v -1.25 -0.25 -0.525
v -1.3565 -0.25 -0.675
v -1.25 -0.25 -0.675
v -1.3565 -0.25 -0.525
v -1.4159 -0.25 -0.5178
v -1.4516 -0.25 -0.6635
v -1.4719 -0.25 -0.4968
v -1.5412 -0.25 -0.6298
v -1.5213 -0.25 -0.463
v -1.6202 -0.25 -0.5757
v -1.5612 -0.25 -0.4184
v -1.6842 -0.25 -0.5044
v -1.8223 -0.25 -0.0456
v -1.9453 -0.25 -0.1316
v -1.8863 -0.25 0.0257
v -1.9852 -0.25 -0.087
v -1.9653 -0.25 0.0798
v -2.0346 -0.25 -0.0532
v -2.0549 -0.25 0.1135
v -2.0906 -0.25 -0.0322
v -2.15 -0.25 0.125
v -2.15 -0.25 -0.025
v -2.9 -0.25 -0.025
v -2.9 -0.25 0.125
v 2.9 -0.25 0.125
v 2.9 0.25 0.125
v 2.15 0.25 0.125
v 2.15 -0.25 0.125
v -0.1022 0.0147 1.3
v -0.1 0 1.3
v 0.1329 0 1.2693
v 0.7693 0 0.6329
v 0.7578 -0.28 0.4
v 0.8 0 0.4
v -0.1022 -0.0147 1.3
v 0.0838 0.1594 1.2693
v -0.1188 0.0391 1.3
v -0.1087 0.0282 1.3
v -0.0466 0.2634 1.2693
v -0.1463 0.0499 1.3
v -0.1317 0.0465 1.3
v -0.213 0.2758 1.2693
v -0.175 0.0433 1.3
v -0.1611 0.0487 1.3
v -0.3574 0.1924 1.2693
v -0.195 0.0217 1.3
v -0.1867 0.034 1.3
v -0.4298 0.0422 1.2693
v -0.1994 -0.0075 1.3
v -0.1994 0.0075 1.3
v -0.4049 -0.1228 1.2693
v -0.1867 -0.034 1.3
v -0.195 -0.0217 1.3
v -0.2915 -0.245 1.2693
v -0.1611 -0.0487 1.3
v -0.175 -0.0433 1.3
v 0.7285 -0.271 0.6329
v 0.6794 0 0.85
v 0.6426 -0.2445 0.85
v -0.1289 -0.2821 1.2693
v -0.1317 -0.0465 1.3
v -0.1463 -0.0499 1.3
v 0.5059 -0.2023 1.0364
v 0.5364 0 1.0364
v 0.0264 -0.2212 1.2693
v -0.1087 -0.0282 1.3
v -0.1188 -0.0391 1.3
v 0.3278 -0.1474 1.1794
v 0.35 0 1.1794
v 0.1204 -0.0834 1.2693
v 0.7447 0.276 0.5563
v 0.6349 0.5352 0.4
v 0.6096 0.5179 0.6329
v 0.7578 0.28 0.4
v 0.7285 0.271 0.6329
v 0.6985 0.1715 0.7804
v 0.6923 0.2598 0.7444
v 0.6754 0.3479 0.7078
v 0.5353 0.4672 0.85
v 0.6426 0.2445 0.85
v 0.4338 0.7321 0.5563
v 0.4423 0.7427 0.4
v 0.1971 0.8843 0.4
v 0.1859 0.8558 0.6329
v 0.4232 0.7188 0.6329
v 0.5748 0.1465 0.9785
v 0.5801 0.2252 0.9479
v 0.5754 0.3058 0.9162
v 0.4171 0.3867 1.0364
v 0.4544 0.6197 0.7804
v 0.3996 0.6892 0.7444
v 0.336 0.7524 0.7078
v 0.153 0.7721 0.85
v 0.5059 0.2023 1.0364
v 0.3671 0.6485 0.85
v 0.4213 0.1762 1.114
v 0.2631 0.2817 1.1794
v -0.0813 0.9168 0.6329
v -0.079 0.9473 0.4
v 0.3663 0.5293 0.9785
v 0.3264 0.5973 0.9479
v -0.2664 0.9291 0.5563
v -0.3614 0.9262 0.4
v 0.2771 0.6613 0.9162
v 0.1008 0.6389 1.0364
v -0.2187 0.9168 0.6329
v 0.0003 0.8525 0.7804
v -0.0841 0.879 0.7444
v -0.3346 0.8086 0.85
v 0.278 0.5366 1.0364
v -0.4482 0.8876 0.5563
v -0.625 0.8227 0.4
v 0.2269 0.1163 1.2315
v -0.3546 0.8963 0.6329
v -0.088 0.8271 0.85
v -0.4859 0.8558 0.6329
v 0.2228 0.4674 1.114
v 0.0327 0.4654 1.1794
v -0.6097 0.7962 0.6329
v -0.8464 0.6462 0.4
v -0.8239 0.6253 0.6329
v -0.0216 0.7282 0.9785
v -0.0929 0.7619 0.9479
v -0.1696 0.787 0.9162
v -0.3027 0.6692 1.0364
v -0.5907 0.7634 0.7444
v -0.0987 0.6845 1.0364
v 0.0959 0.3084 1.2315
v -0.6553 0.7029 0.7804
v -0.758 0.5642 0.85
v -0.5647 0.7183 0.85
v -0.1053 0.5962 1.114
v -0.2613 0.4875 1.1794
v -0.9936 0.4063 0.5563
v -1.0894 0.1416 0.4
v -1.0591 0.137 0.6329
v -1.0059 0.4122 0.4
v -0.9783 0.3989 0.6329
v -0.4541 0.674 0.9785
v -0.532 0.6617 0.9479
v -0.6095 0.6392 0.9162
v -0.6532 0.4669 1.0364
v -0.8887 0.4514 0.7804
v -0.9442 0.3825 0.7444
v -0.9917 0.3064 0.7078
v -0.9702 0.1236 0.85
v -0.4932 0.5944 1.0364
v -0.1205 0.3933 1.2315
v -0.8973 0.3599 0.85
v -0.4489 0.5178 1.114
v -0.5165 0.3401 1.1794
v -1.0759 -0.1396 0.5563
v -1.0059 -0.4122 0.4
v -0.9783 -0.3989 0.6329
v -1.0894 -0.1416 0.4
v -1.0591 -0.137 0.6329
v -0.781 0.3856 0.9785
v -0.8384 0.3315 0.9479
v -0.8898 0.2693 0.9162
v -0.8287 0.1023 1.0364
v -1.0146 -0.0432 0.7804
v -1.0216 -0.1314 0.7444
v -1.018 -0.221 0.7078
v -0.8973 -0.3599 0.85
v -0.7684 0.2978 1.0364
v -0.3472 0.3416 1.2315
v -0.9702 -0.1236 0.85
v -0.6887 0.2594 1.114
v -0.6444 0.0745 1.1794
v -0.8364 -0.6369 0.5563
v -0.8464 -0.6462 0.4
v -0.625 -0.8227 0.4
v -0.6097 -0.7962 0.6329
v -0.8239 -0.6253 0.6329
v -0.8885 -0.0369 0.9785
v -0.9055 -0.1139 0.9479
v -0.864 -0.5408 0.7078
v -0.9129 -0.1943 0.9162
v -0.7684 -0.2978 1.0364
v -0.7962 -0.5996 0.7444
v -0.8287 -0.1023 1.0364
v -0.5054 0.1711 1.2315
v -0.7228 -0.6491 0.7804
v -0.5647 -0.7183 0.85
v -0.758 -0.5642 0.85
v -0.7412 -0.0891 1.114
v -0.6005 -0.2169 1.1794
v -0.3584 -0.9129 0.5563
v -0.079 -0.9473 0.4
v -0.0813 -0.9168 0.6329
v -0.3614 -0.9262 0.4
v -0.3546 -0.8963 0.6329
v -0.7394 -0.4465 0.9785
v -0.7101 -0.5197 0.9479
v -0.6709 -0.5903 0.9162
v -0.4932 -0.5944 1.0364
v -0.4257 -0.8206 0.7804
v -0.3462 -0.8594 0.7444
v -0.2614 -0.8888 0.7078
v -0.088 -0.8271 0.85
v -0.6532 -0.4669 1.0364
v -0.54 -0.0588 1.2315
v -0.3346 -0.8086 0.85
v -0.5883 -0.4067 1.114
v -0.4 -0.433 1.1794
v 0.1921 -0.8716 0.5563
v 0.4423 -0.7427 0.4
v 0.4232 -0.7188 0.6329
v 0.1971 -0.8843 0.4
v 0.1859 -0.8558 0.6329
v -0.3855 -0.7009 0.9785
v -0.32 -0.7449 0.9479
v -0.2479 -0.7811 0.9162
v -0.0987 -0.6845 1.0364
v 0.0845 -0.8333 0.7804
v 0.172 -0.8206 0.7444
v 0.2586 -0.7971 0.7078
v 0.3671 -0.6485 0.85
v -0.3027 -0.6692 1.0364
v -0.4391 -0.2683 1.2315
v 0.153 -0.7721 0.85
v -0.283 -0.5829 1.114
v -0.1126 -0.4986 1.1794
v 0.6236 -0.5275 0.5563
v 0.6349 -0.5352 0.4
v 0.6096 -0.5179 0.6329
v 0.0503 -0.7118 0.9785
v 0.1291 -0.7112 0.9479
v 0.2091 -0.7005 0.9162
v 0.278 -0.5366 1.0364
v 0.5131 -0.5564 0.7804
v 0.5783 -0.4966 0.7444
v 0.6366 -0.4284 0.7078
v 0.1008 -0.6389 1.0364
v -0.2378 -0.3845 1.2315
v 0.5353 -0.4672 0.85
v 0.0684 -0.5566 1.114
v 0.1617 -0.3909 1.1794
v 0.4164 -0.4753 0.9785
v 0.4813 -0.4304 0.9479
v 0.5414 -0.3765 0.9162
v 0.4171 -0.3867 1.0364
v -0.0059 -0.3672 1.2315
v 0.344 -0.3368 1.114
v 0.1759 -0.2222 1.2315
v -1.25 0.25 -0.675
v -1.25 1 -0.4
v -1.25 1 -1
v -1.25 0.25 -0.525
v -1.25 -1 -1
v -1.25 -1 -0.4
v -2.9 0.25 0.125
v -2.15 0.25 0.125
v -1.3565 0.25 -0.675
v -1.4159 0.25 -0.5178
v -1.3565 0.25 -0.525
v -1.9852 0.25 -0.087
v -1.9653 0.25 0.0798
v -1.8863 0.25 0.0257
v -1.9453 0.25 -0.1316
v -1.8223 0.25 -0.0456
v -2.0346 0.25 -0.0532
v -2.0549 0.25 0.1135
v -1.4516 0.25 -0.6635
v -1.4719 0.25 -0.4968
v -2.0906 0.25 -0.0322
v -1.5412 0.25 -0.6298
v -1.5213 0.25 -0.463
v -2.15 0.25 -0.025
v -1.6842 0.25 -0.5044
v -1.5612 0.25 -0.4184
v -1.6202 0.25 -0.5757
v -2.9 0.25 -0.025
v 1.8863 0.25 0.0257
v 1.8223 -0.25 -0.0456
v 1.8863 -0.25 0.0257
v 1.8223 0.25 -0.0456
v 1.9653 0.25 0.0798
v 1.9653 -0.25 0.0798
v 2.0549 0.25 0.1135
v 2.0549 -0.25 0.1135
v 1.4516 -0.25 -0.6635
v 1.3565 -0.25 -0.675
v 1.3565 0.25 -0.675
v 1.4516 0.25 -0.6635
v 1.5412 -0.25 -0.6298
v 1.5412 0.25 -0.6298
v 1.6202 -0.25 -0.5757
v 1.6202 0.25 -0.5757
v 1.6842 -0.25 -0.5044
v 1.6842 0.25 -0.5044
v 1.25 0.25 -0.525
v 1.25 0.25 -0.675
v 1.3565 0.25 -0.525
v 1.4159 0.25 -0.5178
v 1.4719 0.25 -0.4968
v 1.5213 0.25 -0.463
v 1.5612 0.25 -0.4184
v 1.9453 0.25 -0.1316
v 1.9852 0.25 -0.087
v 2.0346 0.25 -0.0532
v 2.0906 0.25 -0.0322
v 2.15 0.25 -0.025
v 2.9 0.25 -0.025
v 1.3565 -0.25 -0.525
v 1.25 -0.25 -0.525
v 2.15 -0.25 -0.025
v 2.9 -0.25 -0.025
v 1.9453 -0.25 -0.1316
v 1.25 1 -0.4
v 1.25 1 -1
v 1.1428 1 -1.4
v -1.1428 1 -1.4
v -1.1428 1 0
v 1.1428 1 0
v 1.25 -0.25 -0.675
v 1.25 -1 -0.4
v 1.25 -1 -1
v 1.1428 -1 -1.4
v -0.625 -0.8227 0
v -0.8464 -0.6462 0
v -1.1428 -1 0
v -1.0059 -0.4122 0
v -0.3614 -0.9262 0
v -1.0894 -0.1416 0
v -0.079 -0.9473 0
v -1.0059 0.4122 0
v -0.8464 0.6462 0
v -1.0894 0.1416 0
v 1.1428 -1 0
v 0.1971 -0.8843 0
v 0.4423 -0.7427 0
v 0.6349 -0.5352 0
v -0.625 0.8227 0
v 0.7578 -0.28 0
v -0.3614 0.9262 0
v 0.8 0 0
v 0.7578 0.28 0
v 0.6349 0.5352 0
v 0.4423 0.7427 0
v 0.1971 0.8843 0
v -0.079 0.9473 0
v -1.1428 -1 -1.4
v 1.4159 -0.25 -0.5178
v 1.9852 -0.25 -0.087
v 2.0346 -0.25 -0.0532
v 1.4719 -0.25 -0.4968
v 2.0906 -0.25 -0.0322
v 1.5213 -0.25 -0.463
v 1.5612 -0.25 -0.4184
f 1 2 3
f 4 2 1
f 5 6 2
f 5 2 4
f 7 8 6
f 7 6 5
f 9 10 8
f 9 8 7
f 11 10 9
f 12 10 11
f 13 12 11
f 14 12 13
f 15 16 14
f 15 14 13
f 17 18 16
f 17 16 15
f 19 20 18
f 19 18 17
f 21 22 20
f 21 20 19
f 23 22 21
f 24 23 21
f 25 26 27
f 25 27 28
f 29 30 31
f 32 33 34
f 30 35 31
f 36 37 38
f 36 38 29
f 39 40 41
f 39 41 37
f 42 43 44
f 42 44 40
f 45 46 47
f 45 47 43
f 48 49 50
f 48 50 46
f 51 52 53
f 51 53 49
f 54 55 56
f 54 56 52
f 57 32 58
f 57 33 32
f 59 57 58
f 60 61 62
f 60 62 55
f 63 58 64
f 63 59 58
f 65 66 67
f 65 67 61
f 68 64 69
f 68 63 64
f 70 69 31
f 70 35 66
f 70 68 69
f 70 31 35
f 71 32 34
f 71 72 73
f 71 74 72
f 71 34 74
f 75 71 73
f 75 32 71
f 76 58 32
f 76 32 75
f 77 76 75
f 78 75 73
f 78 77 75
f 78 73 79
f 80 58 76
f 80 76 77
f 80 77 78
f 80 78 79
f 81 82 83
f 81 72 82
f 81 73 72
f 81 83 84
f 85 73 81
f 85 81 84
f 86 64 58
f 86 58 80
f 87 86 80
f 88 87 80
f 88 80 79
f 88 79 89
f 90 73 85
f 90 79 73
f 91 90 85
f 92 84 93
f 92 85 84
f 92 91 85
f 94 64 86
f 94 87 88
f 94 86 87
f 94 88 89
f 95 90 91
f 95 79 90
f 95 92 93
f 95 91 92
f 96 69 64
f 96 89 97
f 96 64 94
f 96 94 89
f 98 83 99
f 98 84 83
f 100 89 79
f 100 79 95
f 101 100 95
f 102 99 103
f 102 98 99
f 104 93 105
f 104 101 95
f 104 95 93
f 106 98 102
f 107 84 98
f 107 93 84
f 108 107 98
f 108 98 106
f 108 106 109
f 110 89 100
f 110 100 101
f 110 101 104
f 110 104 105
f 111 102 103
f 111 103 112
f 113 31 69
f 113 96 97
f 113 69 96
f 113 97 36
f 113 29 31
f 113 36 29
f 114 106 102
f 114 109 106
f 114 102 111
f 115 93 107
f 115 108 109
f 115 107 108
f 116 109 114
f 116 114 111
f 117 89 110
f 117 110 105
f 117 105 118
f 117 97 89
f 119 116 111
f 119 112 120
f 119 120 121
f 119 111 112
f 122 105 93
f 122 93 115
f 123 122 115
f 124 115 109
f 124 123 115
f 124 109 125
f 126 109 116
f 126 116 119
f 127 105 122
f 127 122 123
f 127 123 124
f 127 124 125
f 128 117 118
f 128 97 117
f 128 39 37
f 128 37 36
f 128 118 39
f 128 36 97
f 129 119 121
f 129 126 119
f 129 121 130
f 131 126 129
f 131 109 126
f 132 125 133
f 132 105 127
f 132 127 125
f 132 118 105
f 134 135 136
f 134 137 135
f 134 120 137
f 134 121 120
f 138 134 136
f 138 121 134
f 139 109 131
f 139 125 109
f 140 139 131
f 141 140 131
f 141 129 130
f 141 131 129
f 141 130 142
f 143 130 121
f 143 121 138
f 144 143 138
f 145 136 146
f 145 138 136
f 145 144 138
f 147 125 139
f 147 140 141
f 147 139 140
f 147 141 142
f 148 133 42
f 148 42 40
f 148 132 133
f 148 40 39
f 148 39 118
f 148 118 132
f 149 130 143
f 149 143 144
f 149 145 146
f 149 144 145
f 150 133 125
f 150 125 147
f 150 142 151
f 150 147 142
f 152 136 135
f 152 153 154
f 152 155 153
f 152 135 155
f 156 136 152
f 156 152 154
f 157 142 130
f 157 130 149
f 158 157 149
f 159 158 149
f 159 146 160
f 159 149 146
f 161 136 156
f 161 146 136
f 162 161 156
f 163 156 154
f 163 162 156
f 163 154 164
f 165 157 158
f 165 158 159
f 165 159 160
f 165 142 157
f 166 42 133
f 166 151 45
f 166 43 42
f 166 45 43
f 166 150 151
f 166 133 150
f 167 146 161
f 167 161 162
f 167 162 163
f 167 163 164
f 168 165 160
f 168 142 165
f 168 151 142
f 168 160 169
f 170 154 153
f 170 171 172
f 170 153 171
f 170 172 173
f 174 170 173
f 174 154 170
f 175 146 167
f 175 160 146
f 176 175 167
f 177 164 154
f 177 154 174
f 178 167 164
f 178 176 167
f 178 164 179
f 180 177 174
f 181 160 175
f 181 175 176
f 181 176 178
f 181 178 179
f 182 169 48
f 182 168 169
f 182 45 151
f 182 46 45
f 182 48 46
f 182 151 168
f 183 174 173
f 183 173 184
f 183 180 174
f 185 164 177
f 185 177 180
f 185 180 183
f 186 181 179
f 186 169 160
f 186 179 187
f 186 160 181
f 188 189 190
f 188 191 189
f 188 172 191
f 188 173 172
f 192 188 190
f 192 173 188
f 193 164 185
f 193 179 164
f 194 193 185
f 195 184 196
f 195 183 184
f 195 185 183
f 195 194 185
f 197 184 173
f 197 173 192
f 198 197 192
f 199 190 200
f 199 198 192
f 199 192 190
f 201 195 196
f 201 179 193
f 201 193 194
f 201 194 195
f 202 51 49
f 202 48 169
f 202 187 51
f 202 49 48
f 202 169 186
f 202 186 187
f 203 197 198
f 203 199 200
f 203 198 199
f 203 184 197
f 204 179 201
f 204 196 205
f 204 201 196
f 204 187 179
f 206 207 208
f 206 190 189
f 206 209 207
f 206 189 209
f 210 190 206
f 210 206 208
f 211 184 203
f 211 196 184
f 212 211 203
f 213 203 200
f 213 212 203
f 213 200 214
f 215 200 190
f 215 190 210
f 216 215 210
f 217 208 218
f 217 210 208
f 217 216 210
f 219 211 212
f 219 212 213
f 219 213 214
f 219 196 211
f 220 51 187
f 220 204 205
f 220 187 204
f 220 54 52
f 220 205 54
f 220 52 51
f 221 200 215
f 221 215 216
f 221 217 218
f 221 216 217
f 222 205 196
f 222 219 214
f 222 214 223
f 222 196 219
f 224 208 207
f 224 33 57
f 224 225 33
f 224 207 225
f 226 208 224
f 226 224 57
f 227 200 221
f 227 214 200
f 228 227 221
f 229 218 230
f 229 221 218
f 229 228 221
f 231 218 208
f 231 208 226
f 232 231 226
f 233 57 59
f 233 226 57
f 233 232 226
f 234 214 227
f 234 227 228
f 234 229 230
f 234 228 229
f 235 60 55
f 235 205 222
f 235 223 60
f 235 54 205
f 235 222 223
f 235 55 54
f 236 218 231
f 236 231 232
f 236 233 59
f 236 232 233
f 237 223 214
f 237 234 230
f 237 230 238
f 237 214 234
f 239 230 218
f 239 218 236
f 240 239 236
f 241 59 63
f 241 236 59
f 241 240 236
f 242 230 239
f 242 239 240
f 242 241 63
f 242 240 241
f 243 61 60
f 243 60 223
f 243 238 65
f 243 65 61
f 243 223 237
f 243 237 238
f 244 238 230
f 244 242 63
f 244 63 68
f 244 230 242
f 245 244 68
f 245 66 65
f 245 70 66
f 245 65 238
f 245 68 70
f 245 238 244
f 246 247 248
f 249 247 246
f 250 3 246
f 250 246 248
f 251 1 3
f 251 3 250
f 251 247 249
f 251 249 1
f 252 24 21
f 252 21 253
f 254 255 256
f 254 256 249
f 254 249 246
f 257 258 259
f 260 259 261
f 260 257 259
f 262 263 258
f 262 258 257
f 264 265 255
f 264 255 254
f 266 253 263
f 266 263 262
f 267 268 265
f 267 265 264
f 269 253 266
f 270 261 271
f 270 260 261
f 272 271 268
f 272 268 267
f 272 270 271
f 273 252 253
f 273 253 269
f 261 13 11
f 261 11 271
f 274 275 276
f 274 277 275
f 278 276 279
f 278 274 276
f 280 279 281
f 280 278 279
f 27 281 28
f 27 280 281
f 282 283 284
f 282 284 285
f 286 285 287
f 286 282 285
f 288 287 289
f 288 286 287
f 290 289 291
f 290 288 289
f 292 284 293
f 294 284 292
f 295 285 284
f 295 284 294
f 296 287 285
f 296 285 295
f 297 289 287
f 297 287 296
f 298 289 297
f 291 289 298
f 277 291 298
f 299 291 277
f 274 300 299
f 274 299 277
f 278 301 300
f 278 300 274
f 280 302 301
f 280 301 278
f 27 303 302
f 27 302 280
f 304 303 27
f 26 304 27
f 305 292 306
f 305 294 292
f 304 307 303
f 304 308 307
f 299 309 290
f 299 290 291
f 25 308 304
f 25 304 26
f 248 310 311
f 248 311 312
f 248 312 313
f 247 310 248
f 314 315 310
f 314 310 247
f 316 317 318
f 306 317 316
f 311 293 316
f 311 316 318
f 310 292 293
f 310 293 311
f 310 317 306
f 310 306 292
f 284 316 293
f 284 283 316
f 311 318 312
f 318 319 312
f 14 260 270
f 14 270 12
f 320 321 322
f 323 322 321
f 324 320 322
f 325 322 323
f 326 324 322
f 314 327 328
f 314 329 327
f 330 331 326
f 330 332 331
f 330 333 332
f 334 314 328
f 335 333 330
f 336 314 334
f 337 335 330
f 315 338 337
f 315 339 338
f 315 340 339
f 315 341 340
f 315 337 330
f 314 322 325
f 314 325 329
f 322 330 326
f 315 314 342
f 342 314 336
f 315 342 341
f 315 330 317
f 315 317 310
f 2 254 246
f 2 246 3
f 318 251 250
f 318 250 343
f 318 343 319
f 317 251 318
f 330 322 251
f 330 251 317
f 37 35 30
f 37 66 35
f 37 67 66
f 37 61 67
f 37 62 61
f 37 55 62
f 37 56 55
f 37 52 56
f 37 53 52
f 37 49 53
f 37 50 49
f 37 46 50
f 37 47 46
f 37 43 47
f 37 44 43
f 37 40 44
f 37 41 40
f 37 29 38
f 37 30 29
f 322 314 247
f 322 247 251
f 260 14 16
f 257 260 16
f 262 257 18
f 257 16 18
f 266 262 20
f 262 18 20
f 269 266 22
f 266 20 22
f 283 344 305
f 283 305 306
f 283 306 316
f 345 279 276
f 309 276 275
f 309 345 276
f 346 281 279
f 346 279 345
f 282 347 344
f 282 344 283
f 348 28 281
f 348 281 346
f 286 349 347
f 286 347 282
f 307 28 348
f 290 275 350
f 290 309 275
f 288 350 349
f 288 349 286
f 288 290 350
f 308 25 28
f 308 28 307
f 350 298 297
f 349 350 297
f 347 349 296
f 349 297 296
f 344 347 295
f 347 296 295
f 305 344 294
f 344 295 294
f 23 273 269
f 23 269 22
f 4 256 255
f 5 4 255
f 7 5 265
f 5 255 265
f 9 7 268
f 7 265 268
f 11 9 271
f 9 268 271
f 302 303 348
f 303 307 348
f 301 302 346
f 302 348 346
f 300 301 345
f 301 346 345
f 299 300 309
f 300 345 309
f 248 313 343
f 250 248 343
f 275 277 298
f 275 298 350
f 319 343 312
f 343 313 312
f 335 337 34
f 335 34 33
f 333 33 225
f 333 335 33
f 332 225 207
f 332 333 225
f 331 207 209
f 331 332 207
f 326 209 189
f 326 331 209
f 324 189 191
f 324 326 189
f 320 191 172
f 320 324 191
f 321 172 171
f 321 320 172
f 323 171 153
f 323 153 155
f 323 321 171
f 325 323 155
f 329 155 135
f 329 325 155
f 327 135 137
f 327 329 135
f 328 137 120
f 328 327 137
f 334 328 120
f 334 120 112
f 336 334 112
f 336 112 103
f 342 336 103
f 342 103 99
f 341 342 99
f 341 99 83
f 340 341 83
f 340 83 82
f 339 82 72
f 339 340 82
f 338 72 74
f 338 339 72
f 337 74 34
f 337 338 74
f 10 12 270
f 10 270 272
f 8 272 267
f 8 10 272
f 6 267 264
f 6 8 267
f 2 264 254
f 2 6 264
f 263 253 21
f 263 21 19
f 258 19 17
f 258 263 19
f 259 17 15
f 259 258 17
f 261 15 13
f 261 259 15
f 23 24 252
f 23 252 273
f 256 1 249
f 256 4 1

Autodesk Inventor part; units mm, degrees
ref_plane "YZ Plane" through (0, 0, 0) normal (1, 0, 0) x (0, 1, 0)
ref_plane "XZ Plane" through (0, 0, 0) normal (0, 1, 0) x (-1, 0, 0)
ref_plane "XY Plane" through (0, 0, 0) normal (0, 0, 1) x (1, 0, 0)
sketch "Skizze1" plane through (0, 0, 0) normal (0, 0, 1) x (1, 0, 0)
  line L0 (-1.25, -1) -> (1.25, -1)
  line L1 (1.25, -1) -> (1.25, 1)
  line L2 (1.25, 1) -> (-1.25, 1)
  line L3 (-1.25, 1) -> (-1.25, -1)
  line L4 (-1.25, -1) -> (1.25, 1) construction
  line L5 (1.25, -1) -> (-1.25, 1) construction
  point P0 (0, 0)
  dimension "d0" = 2.5
  dimension "d1" = 2
extrude "Extrusion1" add sketch "Skizze1" against normal blind 1.4
sketch "Skizze2" plane through (0, 0, 0) normal (0, 0, 1) x (1, 0, 0)
  line L0 (-1.25, -1) -> (1.25, -1) projected
  line L1 (1.25, -1) -> (1.25, 1) projected
  line L2 (1.25, 1) -> (-1.25, 1) projected
  line L3 (-1.25, 1) -> (-1.25, -1) projected
  circle A0 centre (-0.15, 0) radius 0.95
  line L4 (-1.75, 0) -> (1.75, 0) projected
  point P0 (0, 0)
  dimension "d4" = 1.9
  dimension "d5" = 1.1
extrude "Extrusion2" add sketch "Skizze2" along normal blind 1.3 contours L4 A0 | A0 L4
fillet "Rundung1" radius 0.9 1 edges at (-1.1, 0, 1.3)
sketch "Skizze3" plane through (0, 0, 0) normal (0, 1, 0) x (-1, 0, 0)
  line L0 (1.25, 0) -> (-1.25, 0) projected
  line L1 (1.25, 0) -> (1.25, -1.4) projected
  line L2 (-1.25, -1.4) -> (1.25, -1.4) projected
  line L3 (-1.25, 0) -> (-1.25, -1.4) projected
  line L4 (1.25, 0) -> (1.25, -1.4) projected
  line L5 (1.25, -0.6) -> (1.3565, -0.6)
  arc A0 (1.3565, -0.6) -> (1.6227, -0.4614) centre (1.3565, -0.275) ccw
  line L6 (1.6227, -0.4614) -> (1.8838, -0.0886)
  arc A1 (2.15, 0.05) -> (1.8838, -0.0886) centre (2.15, -0.275) ccw
  line L7 (2.15, 0.05) -> (2.9, 0.05)
  line L8 (0, -1.94) -> (0, 1.84) projected
  line L9 (2.15, -0.275) -> (1.3565, -0.275) construction
  point P0 (0, 0)
  dimension "d9" = 55
  dimension "d10" = 2.9
  dimension "d11" = 2.15
  dimension "d12" = 0.05
  dimension "d13" = 0.6
sketch "Skizze4" plane through (-1.25, -1, 0) normal (-1, 0, 0) x (0, 0, 1)
  line L0 (-0.675, 1.25) -> (-0.525, 1.25)
  line L1 (-0.525, 1.25) -> (-0.525, 0.75)
  line L2 (-0.525, 0.75) -> (-0.675, 0.75)
  line L3 (-0.675, 0.75) -> (-0.675, 1.25)
  line L4 (-0.675, 1.25) -> (-0.525, 0.75) construction
  line L5 (-0.525, 1.25) -> (-0.675, 0.75) construction
  point P0 (0, 1)
  point P1 (-0.6, 1)
  point P2 (-0.6, 1)
  point P3 (-0.6, 1)
  dimension "d14" = 0.15
  dimension "d15" = 0.5
sweep "Sweeping1" add profiles "Skizze4" path "Skizze3" path curves L5 A0 L6 A1 L7
mirror "Spiegeln1" about plane through (0, 0, 0) normal (1, 0, 0) of "Sweeping1"
chamfer "Fase1" distance 0.4 angle 15 2 edges at (-1.25, 0, 0) (-1.25, 0, -1.4) measured on face at (-1.25, 0.0833, -1.1583)
chamfer "Fase2" distance 0.4 angle 15 2 edges at (1.25, 0, 0) (1.25, 0, -1.4) measured on face at (1.25, -0.0833, -1.1583)
properties part number "IR LED Reverse Gullwing"
